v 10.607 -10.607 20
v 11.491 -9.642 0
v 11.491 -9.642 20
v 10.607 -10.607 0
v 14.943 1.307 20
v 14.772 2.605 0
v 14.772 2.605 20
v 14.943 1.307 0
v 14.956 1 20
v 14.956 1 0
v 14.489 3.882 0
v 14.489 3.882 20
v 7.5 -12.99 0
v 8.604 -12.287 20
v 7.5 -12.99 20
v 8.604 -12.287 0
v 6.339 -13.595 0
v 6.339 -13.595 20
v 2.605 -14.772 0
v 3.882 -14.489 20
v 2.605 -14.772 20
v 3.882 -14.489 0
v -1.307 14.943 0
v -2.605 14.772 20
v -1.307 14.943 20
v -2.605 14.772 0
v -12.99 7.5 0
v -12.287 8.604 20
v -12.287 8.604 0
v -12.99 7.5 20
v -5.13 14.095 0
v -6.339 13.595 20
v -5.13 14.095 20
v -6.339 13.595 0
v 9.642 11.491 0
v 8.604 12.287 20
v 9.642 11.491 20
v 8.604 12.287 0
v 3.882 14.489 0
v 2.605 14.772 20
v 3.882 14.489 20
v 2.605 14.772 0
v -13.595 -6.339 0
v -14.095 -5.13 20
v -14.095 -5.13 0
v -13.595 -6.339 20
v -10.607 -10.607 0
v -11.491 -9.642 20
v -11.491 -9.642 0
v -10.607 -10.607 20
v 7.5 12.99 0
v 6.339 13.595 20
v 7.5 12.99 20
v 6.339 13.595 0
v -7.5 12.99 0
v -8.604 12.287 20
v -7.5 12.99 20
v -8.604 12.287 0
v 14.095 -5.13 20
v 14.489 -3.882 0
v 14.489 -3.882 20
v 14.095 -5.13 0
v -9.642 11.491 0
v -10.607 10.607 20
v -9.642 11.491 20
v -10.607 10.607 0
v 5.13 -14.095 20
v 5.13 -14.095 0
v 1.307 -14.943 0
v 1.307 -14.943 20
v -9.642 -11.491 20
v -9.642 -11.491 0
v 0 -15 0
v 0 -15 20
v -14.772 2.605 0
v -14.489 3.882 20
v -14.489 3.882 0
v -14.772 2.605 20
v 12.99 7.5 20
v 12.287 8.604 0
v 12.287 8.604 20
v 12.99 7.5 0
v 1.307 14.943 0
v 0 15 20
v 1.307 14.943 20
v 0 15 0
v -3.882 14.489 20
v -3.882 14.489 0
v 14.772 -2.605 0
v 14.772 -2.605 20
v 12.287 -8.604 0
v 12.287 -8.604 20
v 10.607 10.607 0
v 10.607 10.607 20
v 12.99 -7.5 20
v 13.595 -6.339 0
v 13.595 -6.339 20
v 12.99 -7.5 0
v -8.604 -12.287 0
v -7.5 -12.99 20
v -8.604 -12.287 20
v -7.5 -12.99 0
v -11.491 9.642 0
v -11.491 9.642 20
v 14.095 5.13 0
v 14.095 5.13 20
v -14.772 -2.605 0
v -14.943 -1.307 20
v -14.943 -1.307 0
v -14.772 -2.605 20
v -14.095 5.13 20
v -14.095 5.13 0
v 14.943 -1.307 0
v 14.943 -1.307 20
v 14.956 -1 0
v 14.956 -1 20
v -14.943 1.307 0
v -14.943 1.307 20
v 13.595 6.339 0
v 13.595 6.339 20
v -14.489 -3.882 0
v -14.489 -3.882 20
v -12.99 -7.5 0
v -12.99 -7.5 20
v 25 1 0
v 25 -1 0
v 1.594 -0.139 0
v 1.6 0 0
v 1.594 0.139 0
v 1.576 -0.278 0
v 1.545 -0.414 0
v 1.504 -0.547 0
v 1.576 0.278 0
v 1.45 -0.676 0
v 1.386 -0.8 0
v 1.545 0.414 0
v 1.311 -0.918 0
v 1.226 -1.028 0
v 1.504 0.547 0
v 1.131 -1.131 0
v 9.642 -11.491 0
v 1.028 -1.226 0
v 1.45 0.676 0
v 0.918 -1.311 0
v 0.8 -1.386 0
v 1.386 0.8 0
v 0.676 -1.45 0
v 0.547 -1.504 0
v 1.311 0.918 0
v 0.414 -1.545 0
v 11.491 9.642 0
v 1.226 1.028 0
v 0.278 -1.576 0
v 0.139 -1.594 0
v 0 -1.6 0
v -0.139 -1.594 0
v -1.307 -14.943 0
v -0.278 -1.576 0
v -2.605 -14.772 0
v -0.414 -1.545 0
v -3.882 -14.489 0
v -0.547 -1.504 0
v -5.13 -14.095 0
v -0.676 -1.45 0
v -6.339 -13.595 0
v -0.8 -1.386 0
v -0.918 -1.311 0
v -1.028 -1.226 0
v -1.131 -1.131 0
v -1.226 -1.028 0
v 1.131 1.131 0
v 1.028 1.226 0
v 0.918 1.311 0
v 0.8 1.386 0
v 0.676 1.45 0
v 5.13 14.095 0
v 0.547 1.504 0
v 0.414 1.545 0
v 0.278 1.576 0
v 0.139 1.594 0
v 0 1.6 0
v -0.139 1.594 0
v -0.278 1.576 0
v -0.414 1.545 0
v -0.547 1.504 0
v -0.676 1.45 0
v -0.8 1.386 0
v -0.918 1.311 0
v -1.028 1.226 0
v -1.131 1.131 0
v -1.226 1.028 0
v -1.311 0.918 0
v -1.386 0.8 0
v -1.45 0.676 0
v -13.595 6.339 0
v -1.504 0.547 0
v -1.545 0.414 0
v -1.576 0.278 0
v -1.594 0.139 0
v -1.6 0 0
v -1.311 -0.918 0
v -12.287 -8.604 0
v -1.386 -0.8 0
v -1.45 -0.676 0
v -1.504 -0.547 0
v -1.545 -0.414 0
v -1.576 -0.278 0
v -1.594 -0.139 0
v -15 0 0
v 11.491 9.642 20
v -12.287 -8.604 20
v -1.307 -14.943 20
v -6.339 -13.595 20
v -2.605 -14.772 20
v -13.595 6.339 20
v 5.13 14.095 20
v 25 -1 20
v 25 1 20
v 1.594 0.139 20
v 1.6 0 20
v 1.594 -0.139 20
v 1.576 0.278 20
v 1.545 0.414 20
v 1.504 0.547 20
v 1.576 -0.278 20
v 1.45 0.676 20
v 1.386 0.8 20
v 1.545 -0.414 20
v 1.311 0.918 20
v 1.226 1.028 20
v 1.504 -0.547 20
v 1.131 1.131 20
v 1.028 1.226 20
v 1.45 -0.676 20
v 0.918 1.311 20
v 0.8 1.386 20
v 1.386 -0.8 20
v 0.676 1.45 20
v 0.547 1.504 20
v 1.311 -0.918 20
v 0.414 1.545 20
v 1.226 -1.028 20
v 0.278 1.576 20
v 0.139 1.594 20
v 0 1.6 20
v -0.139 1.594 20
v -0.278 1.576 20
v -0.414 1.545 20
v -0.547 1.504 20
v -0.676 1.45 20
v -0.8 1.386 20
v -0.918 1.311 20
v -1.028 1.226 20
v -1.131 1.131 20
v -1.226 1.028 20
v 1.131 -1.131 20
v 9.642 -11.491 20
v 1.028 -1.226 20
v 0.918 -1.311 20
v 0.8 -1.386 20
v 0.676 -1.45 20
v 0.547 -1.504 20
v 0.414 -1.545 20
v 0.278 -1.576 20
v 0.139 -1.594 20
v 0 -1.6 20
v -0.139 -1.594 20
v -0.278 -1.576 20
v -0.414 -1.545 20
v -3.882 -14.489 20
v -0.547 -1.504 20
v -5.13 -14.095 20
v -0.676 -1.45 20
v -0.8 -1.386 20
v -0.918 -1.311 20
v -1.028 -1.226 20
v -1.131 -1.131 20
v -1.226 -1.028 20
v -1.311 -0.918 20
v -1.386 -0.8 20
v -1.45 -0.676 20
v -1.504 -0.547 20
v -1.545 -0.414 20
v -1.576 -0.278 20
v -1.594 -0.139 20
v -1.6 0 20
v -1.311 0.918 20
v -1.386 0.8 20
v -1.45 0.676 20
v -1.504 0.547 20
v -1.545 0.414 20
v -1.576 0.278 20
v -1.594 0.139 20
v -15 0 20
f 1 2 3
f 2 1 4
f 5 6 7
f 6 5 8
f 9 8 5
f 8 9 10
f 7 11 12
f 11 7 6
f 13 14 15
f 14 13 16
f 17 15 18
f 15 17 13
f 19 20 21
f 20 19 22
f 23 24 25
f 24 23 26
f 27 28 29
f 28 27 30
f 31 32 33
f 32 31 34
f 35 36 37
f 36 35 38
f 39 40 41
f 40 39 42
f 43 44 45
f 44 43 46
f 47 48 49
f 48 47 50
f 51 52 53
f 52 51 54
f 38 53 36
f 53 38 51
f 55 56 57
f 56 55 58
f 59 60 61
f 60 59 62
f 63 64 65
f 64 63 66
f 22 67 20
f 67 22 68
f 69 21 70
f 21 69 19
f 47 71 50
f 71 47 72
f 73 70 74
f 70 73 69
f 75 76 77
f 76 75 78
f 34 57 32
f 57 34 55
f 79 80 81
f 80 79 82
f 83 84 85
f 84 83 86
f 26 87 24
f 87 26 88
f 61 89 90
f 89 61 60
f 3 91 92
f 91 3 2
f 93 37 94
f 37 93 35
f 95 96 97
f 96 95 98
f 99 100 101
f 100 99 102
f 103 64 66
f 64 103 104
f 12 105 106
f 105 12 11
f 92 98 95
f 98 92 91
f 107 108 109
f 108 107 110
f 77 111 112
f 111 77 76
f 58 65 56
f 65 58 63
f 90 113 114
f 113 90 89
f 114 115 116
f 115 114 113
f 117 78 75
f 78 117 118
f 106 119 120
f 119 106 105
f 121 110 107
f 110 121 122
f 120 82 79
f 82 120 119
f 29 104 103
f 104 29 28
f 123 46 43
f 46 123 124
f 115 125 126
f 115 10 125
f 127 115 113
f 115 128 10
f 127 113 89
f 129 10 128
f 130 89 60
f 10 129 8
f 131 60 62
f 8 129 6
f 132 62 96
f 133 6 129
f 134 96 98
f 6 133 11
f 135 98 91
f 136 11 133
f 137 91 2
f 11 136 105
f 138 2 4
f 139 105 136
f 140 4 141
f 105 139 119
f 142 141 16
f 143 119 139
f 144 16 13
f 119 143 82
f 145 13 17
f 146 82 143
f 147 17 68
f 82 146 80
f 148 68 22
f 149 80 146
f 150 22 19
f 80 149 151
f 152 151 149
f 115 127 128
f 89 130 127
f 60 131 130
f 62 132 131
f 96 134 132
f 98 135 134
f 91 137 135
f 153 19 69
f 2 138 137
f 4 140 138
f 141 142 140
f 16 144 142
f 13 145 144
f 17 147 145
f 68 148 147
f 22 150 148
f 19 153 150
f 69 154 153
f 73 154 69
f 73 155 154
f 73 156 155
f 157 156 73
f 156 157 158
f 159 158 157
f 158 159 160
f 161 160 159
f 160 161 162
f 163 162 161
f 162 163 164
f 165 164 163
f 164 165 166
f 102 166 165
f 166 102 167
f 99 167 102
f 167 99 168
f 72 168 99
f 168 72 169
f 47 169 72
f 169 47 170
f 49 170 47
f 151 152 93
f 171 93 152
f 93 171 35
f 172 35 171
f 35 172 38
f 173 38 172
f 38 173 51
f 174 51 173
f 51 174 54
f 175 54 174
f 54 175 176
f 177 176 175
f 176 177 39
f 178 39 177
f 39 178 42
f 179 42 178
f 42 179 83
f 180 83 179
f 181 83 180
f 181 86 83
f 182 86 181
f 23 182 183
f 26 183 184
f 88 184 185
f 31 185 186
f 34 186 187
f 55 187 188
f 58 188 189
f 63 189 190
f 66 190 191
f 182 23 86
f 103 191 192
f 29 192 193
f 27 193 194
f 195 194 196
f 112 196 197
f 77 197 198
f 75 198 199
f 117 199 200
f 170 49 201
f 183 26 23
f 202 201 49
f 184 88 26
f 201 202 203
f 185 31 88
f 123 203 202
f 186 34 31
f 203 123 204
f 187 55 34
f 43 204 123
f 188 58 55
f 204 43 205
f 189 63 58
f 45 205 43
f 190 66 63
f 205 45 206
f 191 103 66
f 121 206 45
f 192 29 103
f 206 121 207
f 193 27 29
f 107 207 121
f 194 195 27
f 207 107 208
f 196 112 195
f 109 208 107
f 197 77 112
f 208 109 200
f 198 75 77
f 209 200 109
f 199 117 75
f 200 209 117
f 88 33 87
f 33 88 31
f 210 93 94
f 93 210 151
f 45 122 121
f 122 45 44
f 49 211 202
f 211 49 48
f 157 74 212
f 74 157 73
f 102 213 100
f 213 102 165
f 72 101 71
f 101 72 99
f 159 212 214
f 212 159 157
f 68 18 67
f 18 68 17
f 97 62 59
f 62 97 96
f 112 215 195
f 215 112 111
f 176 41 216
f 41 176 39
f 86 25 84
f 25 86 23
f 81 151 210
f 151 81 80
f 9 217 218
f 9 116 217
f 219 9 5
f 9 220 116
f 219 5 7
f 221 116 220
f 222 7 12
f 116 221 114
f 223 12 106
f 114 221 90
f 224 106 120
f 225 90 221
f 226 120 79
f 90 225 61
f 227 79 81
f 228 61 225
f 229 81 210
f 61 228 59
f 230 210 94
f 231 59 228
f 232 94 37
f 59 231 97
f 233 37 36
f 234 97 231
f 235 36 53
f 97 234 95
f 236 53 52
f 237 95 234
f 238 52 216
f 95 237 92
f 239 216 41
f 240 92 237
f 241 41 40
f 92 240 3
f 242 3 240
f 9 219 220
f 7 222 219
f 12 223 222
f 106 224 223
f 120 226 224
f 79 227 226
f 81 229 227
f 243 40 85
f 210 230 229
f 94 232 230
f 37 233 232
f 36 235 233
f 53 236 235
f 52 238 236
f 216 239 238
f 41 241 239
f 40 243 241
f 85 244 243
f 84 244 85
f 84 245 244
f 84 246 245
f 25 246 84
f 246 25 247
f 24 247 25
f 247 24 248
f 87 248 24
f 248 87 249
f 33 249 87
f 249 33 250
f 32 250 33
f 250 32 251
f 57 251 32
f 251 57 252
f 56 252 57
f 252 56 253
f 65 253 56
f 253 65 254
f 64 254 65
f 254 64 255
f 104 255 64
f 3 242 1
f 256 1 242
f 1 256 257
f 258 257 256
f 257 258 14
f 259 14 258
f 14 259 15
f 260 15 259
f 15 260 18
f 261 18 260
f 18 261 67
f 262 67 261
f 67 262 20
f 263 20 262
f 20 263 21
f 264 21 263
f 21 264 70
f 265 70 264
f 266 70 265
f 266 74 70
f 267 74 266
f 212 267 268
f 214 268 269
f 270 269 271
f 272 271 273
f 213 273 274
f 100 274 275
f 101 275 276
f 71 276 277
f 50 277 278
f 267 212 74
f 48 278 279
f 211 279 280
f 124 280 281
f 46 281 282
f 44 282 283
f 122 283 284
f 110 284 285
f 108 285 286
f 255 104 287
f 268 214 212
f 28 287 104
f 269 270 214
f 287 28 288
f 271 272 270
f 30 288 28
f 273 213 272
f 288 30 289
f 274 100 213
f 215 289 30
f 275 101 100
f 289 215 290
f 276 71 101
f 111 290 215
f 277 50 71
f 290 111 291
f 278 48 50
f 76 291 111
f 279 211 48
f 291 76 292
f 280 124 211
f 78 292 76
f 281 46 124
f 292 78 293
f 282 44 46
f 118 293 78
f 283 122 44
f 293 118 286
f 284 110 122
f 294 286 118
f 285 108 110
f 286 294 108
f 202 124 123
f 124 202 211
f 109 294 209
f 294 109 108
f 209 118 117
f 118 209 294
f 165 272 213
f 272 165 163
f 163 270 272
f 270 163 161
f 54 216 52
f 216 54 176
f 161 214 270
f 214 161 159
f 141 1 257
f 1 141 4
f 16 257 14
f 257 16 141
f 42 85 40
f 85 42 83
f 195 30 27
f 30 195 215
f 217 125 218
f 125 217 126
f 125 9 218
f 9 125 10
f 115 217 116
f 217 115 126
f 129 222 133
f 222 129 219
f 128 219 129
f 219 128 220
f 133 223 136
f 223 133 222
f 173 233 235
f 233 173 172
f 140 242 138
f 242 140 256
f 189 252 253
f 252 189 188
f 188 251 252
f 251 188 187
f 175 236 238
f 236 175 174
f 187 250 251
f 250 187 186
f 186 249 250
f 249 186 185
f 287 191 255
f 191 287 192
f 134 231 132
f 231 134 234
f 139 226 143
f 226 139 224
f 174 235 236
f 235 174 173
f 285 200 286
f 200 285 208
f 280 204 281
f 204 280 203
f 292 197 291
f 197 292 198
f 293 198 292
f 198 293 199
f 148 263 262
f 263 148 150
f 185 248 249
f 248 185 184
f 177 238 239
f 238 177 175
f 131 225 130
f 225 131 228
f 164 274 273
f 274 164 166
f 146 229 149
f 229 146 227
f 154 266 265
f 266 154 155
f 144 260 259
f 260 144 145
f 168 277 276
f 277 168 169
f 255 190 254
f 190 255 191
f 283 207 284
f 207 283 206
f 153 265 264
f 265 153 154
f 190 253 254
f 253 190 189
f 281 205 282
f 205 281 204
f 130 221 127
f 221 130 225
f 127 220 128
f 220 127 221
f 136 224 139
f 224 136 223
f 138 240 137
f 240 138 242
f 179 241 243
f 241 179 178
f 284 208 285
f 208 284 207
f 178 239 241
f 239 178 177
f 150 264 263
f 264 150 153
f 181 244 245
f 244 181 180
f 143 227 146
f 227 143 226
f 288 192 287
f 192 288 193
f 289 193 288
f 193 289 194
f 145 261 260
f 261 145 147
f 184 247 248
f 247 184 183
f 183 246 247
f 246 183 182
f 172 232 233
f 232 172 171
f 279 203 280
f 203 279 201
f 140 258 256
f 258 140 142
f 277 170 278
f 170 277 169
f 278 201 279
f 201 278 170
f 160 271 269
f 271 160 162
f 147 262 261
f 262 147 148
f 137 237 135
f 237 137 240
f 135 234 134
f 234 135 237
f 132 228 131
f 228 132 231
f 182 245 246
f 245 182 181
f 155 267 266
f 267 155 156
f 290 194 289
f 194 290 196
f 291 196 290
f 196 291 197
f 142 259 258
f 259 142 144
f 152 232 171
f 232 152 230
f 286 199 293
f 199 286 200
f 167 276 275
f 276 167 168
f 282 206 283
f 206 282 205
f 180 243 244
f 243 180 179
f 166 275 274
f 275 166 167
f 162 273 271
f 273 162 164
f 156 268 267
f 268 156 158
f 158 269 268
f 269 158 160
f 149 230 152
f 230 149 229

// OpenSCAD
// Pieza de Prueba Paramétrica
base_r = 15.0; // Radio de la base circular
altura = 20.0; // Altura total de la pieza de prueba
agujero_d = 3.2; // Diámetro del orificio central para tornillo M3
soporte_espesor = 2.0; // Espesor del nervio de refuerzo triangular

$fn = $preview ? 12 : 72;

difference() {
    union() {
        // Cuerpo principal
        cylinder(r=base_r, h=altura);
        
        // Nervio de refuerzo
        translate([0, -soporte_espesor/2, 0])
        cube([base_r + 10, soporte_espesor, altura]);
    }
    
    // Agujero pasante central para tornillo M3
    translate([0, 0, -1])
    cylinder(d=agujero_d, h=altura + 2);
}
